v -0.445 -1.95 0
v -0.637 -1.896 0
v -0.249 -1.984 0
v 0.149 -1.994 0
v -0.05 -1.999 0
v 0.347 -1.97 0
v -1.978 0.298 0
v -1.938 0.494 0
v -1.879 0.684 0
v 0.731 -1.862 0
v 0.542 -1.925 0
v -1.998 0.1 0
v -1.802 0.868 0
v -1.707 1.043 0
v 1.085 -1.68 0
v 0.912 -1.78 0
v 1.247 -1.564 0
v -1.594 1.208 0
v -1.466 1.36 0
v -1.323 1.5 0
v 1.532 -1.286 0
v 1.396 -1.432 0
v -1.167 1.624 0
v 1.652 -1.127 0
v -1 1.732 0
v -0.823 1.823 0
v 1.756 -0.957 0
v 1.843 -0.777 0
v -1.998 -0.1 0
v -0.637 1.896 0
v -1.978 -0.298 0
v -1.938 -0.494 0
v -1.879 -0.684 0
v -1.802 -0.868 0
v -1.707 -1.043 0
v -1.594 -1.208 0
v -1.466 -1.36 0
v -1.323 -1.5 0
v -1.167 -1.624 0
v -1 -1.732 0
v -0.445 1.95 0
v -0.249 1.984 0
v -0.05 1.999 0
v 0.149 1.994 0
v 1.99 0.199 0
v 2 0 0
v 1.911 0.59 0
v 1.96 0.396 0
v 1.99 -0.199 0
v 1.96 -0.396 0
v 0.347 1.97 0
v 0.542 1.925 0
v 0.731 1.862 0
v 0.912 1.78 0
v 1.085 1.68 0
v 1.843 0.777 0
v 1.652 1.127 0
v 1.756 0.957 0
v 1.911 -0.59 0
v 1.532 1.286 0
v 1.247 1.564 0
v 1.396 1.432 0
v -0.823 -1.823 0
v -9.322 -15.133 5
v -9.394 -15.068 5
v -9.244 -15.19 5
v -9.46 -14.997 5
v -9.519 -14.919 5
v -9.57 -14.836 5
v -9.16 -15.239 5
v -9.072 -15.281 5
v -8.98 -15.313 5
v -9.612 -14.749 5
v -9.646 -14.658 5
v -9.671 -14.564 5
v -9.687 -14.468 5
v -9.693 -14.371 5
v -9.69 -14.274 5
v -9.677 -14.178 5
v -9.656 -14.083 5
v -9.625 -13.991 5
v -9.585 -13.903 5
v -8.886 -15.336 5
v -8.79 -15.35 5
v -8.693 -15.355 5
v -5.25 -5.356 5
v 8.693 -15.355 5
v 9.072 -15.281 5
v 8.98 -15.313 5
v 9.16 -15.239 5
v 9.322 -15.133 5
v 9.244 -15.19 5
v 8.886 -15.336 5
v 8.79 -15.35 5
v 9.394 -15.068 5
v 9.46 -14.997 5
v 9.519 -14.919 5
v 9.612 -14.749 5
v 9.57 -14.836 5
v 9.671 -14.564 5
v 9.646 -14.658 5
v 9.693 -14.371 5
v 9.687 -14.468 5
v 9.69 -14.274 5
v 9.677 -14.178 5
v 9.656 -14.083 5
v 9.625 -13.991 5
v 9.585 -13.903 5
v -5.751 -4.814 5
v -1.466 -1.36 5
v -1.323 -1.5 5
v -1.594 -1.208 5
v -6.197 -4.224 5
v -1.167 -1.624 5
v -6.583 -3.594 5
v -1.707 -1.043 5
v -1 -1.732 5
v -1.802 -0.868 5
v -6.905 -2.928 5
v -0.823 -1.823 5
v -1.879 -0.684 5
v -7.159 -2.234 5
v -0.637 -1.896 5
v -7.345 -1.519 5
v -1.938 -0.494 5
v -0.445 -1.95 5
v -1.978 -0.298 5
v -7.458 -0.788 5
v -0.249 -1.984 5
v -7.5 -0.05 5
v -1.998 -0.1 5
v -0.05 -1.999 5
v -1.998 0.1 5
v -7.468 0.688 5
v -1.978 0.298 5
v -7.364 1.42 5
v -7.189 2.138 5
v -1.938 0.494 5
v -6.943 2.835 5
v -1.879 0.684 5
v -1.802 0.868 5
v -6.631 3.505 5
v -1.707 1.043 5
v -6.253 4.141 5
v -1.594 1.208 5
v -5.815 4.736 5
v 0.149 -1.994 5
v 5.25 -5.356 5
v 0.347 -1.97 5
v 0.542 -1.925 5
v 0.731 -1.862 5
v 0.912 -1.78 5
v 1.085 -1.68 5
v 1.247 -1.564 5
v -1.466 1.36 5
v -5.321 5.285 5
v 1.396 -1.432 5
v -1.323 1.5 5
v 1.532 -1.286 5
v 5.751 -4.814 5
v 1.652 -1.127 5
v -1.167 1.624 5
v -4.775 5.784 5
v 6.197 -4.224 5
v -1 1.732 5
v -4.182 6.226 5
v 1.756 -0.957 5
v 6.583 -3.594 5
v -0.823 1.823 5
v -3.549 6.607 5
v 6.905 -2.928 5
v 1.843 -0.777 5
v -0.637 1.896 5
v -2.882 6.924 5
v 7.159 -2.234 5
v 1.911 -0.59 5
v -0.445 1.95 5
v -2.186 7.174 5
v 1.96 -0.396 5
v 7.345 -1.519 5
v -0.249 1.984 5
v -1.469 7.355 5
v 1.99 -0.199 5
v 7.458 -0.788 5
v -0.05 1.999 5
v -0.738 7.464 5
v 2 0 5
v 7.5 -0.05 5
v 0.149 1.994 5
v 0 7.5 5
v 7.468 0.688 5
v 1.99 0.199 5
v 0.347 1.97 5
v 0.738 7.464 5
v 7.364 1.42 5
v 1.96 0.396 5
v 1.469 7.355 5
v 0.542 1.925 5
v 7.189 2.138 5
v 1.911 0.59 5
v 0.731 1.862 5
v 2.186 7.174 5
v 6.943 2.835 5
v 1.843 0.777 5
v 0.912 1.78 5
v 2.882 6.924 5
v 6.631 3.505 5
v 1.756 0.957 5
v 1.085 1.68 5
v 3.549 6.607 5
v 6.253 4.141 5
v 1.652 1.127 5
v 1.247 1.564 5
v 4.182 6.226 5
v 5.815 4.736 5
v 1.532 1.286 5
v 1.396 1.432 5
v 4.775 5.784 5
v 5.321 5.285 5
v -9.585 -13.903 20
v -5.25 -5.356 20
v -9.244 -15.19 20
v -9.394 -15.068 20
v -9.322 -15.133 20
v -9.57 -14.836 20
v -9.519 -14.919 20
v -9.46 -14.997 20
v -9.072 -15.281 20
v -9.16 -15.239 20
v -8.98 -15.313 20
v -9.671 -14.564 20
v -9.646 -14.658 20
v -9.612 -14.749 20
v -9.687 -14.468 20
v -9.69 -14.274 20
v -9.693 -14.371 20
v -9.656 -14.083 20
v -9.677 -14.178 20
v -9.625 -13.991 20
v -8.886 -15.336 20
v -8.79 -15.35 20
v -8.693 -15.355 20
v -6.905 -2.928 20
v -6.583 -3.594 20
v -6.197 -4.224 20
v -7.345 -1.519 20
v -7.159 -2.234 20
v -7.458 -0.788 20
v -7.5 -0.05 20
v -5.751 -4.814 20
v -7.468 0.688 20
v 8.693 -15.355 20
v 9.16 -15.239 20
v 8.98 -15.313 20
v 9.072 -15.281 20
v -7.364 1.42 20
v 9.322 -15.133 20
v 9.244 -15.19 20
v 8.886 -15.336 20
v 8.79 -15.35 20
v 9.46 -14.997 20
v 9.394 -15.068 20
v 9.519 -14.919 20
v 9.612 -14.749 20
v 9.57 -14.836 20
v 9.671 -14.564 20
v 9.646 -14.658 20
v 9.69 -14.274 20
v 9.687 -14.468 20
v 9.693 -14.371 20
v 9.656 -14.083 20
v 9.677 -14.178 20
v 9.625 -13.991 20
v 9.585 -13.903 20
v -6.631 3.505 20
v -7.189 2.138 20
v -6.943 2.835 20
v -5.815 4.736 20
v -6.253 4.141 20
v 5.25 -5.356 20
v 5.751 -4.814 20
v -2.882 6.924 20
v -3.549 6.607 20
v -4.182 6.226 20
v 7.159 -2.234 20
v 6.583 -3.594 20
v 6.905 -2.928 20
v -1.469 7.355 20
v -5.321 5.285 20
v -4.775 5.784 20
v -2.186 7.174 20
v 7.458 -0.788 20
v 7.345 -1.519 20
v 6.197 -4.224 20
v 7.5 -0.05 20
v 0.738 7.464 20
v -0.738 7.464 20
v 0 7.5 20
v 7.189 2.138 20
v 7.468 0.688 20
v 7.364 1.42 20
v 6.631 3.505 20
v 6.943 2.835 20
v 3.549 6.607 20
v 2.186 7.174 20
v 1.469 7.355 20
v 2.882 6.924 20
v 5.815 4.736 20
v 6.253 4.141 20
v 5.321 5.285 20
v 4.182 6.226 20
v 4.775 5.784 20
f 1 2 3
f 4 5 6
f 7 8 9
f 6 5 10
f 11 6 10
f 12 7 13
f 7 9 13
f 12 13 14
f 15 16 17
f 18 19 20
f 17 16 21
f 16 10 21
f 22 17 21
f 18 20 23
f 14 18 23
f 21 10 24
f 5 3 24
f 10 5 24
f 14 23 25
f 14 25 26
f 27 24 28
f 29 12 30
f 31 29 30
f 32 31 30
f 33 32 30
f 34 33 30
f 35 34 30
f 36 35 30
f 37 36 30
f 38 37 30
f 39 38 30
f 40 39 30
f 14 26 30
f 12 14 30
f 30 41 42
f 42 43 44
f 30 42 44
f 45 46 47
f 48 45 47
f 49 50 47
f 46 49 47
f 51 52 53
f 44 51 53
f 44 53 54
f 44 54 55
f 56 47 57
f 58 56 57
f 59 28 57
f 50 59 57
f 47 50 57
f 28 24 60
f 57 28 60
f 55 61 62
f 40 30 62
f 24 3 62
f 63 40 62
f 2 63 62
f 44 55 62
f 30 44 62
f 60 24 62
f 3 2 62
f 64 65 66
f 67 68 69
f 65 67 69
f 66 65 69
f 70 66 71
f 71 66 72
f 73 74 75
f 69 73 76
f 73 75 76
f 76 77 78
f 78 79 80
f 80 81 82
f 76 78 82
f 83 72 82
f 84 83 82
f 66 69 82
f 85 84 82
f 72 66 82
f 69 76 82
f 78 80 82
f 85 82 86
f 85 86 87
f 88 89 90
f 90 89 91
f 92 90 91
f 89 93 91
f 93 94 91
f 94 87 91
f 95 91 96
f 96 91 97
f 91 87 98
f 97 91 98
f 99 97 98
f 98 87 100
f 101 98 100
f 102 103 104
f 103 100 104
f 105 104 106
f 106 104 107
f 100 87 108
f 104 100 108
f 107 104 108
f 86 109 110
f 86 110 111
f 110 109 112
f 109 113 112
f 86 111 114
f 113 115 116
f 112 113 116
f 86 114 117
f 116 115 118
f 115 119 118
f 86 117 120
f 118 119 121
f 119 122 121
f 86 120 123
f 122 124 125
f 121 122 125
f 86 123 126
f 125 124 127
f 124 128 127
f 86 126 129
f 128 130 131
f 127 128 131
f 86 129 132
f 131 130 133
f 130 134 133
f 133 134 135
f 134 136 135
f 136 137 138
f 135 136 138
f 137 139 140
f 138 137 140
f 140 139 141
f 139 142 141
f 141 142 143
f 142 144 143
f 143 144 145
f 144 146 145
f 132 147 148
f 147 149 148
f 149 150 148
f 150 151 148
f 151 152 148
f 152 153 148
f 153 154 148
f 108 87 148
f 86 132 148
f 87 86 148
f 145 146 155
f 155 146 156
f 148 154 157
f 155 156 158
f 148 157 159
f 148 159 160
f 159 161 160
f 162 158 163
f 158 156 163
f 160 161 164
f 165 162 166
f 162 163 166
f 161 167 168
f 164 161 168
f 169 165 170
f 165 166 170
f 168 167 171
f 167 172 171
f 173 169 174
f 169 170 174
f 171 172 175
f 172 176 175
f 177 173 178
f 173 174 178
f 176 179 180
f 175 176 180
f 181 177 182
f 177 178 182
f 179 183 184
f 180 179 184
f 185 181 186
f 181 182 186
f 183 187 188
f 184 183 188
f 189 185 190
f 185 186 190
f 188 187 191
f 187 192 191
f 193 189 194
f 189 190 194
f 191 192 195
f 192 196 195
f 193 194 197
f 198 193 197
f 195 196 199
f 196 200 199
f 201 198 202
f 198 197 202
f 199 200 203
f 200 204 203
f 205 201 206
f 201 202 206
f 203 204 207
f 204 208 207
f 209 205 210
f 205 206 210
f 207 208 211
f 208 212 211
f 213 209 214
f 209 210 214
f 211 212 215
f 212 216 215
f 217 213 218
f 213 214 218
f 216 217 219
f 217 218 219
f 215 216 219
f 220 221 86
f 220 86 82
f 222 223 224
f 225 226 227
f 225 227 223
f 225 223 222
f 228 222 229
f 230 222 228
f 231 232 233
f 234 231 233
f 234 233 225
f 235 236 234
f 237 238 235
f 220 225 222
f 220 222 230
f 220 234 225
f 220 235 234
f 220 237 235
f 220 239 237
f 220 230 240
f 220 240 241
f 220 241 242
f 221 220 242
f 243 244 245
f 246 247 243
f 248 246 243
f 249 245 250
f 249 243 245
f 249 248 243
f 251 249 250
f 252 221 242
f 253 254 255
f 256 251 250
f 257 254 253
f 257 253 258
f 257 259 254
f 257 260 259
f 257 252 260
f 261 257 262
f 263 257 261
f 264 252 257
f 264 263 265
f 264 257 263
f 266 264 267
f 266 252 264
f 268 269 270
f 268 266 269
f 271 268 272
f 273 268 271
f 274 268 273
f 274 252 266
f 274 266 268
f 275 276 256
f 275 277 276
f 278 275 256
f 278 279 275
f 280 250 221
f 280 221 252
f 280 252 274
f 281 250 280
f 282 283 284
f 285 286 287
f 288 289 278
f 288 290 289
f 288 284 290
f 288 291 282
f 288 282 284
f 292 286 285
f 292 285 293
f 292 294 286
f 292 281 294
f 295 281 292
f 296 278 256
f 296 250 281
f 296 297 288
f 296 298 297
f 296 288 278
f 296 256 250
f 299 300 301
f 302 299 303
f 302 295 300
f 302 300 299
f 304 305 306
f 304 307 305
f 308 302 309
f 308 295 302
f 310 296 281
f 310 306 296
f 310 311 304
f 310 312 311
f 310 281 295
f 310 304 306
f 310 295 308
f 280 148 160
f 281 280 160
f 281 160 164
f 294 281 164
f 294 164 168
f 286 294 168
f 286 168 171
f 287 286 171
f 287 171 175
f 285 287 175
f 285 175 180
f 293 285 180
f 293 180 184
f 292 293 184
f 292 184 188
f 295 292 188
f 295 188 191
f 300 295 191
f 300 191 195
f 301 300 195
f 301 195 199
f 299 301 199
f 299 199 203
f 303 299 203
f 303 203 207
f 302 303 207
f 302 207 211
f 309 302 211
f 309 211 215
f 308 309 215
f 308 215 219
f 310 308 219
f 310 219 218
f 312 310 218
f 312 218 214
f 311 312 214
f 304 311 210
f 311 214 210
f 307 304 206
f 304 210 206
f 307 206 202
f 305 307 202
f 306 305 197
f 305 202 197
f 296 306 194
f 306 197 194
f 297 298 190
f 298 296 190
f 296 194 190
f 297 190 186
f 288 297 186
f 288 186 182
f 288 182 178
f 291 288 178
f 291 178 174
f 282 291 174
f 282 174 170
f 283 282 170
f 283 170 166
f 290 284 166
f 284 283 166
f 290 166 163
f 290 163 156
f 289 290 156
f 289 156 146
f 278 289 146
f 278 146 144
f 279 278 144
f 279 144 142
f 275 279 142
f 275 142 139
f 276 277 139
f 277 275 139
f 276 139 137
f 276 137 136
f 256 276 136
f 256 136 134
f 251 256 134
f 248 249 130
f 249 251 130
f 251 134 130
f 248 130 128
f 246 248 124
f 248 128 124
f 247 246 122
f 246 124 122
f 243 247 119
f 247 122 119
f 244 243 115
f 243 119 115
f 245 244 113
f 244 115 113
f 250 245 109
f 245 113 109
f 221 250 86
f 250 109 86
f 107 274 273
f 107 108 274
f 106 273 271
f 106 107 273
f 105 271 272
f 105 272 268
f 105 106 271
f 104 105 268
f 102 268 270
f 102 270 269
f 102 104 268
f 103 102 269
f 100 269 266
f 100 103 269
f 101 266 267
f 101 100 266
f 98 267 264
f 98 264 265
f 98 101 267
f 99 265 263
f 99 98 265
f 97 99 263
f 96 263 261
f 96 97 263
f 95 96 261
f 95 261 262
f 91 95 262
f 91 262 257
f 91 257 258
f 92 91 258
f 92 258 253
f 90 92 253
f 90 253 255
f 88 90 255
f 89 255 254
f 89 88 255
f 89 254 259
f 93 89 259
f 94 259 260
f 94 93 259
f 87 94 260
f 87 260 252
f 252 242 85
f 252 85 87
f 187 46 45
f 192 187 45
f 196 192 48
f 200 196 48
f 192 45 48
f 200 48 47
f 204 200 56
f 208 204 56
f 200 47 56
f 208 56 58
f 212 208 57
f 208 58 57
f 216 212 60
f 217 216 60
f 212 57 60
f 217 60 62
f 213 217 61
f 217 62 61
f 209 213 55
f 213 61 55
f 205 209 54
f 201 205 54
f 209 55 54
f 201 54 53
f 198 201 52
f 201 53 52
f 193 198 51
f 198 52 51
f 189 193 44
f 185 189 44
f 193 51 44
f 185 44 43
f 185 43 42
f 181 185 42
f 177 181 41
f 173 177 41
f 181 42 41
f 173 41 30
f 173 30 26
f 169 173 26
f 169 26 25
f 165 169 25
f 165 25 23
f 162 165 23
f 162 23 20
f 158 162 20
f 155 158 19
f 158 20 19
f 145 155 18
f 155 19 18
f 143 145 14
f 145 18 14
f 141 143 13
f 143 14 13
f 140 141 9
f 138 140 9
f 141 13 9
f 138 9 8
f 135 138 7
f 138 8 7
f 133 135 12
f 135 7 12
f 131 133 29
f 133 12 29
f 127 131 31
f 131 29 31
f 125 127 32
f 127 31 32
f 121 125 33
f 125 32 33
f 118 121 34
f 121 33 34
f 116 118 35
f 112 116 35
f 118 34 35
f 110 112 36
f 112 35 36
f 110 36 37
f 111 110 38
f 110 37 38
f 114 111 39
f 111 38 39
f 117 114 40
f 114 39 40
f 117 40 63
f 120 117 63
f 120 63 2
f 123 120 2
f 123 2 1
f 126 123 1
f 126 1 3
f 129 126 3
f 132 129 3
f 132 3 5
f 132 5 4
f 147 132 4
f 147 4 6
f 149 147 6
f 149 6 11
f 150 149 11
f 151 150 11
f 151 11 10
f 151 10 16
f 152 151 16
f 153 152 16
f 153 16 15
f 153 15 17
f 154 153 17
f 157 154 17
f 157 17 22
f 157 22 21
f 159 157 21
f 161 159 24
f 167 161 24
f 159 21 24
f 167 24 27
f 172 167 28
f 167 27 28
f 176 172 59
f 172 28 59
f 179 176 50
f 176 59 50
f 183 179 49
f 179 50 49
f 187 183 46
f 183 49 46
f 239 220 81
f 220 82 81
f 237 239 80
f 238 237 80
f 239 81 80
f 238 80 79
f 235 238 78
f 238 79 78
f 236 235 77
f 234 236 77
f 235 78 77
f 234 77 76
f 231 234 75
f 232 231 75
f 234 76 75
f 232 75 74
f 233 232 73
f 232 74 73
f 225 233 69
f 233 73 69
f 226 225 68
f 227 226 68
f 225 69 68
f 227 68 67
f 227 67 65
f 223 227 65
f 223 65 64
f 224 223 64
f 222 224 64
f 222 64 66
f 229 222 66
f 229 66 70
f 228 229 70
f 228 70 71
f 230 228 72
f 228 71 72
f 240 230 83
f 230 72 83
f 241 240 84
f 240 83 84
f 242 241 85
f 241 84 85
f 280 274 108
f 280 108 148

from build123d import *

# Parameters (mm, degrees)
SKETCH1_R           = 2
BOSS_EXTRUDE1_DEPTH = 5
SKETCH2_R           = 7.5
BOSS_EXTRUDE2_DEPTH = 15
BOSS_EXTRUDE3_DEPTH = 15
FILLET1_R           = 1


with BuildPart() as part:
    # Sketch1 → Boss-Extrude1 (new body)
    with BuildSketch(Plane.XY):
        Circle(SKETCH1_R)
    extrude(amount=BOSS_EXTRUDE1_DEPTH)

    # Sketch2 → Boss-Extrude2 (add)
    with BuildSketch(Plane.XY.offset(5)):
        Circle(SKETCH2_R)
    extrude(amount=BOSS_EXTRUDE2_DEPTH)

    # Sketch3 → Boss-Extrude3 (add)
    with BuildSketch(Plane.XY.offset(20)):
        Polygon((-5.249682076, -5.356382931), (-10.321706995, -15.355132011), (10.321706995, -15.355132011), (5.249682076, -5.356382931), align=None)
    extrude(amount=-BOSS_EXTRUDE3_DEPTH)

    # Fillet1
    fillet1_edges = [part.edges().sort_by_distance(p)[0] for p in [
        (10.321706995, -15.355132011, 12.5),
        (-10.321706995, -15.355132011, 12.5),
    ]]
    fillet(fillet1_edges, radius=FILLET1_R)


solid = part.part
